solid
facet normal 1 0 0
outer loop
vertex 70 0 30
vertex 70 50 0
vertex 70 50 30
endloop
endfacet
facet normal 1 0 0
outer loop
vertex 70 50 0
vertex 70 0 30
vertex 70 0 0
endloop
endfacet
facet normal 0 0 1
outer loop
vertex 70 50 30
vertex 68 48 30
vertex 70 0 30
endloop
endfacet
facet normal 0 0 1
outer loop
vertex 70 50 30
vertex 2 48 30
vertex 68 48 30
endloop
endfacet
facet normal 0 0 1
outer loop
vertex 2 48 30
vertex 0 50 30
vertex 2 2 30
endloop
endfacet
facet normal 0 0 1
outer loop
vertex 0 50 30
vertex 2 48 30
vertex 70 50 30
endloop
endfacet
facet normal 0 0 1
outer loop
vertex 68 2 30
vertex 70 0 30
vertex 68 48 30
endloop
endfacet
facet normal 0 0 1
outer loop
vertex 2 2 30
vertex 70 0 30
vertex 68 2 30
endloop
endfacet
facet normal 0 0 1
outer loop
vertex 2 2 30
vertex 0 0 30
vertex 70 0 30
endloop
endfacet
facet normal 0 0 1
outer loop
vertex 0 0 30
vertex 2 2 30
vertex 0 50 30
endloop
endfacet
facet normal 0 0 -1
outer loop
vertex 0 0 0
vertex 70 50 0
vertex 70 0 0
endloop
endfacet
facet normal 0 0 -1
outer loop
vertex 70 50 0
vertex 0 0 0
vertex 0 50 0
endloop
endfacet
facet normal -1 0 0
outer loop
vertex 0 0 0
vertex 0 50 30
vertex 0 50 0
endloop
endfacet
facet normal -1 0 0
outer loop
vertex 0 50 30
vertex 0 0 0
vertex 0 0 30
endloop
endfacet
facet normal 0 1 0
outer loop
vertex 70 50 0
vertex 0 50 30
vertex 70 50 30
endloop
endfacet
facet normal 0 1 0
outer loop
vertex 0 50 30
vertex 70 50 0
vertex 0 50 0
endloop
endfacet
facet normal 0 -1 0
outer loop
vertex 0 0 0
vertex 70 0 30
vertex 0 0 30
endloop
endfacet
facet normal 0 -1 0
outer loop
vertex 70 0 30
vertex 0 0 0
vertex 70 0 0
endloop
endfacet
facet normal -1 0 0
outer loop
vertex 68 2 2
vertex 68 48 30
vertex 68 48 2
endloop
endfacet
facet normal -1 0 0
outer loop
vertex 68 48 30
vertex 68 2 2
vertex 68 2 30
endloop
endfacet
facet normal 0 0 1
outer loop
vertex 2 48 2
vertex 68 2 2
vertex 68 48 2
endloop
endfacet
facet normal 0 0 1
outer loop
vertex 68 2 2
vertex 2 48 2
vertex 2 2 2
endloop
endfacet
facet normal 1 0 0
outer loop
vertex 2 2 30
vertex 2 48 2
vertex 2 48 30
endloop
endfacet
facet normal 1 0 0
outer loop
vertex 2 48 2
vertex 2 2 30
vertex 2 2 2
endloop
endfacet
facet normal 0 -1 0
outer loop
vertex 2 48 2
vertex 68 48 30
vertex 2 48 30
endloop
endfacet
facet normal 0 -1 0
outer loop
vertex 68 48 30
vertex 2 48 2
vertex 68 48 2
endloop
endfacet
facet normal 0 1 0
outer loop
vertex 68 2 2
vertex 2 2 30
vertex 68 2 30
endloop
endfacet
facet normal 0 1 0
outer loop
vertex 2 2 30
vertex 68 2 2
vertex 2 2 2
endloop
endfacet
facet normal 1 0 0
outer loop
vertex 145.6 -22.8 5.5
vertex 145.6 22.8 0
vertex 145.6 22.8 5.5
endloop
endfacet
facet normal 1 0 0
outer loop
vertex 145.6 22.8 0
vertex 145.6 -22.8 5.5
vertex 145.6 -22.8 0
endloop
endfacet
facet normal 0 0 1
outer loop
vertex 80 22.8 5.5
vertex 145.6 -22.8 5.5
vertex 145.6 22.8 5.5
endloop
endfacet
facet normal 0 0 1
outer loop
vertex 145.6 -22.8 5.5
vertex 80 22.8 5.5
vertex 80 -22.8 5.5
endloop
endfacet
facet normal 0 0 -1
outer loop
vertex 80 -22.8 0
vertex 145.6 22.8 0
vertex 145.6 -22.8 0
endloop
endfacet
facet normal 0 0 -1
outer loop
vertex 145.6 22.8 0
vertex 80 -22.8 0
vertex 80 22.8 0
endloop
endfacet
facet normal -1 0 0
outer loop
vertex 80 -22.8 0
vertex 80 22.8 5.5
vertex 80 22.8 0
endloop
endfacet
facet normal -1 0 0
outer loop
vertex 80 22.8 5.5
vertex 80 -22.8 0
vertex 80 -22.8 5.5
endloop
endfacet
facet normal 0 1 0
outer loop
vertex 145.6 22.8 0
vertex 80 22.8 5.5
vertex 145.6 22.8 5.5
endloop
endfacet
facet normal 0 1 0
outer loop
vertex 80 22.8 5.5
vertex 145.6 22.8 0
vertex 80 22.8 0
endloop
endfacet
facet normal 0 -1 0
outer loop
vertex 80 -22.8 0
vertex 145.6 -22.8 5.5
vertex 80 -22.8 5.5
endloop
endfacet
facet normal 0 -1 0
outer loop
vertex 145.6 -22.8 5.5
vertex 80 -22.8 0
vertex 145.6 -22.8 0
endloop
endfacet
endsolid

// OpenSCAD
// Two-part enclosure for small electronics board (e.g., Arduino-based logger)
// Print orientation: box on the bed (z = 0), lid on top (+X side), both build upward

// ---------------- Parameters ----------------
box_x      = 70;    // box outer size in X (mm)
box_y      = 50;    // box outer size in Y (mm)
box_z      = 30;    // box outer size in Z (mm)
box_wall   = 2;     // box wall thickness (mm)
box_floor  = 2;     // box floor thickness (mm)

lip_x      = 65.6;  // lip outer size in X (mm)
lip_y      = 45.6;  // lip outer size in Y (mm)
lip_t      = 1.5;   // lip wall thickness (mm)
lip_h      = 4;     // lip height (mm)

gap        = 10;    // gap between box and lid (mm)

eps        = 0.5;   // cutter overshoot past faces (mm)

$fn = 64;

// ---------------- Derived ----------------
box_inner_x = box_x - 2 * box_wall;
box_inner_y = box_y - 2 * box_wall;
lip_outer_x = lip_x;
lip_outer_y = lip_y;

// ---------------- Model ----------------
union() {
    // Part 1: Box, open top
    difference() {
        cube([box_x, box_y, box_z]);
        translate([box_wall, box_wall, box_floor])
            cube([box_inner_x, box_inner_y, box_z - box_floor + eps]);
    }

    // Part 2: Lid, printed upside down (plate on bed, lip on top)
    translate([box_x + gap, -lip_outer_y / 2, 0])
        cube([lip_outer_x, lip_outer_y, lip_t + lip_h]);
}
